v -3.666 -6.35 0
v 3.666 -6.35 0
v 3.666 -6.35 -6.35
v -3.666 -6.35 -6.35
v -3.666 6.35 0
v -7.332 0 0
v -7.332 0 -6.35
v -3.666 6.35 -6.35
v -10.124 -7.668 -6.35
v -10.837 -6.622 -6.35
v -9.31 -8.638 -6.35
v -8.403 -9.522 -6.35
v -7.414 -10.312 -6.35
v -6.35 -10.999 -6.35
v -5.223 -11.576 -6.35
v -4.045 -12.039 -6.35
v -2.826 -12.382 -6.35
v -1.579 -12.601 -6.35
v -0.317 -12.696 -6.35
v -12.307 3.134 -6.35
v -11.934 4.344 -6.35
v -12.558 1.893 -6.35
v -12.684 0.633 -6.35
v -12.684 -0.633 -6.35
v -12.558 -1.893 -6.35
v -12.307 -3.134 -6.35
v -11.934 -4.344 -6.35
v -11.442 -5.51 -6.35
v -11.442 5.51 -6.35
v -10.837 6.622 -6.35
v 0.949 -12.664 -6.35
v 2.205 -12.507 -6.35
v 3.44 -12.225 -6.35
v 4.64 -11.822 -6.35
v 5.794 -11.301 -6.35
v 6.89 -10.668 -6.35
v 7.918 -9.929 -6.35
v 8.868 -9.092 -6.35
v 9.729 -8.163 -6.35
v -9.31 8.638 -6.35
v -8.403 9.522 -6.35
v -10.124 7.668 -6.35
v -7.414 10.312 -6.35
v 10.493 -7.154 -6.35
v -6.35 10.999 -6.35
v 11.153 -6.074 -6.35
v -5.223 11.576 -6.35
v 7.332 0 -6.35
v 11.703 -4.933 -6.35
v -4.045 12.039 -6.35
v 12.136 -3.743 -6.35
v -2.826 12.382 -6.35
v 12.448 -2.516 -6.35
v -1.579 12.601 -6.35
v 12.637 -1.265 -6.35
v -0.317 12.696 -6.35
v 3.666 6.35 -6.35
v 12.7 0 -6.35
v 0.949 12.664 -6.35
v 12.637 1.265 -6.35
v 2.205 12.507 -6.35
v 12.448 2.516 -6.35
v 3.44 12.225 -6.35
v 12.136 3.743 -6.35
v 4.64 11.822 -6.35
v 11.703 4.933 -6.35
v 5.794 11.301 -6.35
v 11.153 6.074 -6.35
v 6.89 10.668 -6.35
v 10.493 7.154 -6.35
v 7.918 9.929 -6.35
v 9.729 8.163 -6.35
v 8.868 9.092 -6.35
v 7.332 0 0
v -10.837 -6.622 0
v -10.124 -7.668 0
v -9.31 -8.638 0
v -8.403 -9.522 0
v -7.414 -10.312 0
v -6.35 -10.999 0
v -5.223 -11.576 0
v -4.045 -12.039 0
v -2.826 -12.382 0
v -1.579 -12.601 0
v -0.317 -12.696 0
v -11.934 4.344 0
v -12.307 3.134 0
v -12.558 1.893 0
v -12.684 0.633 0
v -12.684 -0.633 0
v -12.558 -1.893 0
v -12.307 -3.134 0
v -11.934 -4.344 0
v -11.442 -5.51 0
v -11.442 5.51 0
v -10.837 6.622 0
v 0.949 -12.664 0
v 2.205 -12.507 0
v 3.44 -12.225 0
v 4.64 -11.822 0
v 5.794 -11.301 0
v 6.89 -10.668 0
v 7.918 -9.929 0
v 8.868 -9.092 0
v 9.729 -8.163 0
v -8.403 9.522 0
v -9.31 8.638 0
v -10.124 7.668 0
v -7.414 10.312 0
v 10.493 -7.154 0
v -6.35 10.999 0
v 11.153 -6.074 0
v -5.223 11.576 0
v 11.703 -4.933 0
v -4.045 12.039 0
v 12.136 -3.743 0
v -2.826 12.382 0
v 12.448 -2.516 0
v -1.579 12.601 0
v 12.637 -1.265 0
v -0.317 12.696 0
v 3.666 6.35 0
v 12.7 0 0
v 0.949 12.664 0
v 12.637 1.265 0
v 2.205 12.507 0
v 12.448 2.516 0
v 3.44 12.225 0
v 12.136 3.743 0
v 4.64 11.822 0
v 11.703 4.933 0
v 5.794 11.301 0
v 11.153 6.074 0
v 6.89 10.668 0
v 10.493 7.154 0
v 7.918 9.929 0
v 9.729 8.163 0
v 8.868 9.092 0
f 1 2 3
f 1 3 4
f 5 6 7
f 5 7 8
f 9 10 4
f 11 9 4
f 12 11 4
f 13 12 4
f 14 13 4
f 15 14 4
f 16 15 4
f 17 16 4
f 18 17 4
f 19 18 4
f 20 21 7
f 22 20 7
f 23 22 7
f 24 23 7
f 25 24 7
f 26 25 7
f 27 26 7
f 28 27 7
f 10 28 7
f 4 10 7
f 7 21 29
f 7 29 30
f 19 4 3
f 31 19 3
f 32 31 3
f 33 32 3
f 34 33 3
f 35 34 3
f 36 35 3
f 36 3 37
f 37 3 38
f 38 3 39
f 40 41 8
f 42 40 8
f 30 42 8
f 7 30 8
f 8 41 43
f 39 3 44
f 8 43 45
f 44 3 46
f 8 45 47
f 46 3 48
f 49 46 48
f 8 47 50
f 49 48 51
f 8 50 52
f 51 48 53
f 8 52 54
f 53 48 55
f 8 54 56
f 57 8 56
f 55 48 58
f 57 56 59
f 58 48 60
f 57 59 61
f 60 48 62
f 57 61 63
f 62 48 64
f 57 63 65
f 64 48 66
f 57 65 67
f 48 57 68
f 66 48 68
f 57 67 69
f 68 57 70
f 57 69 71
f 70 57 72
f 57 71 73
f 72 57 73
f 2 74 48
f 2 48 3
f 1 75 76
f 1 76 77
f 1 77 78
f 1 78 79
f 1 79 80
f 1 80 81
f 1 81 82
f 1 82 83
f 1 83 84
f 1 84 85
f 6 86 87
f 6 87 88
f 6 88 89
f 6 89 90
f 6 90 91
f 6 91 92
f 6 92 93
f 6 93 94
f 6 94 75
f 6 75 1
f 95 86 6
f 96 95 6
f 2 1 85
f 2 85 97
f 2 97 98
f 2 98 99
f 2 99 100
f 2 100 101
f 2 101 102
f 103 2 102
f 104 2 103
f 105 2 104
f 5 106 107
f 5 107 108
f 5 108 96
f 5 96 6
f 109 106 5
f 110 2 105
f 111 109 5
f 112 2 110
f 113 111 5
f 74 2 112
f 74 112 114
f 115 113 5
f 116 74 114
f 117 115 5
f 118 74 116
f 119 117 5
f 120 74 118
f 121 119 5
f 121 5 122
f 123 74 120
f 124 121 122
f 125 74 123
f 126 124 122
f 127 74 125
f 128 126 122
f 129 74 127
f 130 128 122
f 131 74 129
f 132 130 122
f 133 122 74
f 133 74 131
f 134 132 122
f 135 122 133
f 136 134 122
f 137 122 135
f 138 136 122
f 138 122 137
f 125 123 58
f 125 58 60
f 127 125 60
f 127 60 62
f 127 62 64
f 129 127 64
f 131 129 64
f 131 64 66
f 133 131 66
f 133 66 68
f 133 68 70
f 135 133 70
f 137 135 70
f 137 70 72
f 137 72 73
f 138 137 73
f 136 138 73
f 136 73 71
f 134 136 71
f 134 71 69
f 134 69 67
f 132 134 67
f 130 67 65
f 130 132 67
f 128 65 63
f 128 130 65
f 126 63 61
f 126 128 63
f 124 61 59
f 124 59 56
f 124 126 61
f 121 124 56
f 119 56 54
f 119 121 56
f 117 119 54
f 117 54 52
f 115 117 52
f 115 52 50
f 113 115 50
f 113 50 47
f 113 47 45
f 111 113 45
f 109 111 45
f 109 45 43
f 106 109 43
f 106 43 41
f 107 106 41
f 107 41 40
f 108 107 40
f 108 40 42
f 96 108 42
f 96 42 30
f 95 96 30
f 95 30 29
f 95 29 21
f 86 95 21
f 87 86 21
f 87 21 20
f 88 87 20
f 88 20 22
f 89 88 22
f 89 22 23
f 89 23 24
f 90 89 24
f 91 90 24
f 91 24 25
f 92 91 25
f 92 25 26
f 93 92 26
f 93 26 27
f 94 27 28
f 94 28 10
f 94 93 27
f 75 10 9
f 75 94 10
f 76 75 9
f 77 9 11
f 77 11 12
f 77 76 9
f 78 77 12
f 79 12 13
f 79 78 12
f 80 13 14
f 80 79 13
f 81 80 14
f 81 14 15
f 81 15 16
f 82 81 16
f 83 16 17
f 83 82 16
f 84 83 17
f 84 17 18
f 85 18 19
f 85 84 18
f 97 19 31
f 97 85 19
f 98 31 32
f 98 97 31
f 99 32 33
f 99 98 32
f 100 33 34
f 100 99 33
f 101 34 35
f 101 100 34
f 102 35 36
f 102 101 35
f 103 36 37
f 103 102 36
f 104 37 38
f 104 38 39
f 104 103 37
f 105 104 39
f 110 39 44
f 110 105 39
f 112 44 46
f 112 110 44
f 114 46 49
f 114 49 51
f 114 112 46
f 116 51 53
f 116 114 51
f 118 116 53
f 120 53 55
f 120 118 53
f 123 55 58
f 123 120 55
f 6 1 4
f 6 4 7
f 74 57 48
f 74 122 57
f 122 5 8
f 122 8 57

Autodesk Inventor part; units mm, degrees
ref_plane "YZ Plane" through (0, 0, 0) normal (1, 0, 0) x (0, 1, 0)
ref_plane "XZ Plane" through (0, 0, 0) normal (0, 1, 0) x (-1, 0, 0)
ref_plane "XY Plane" through (0, 0, 0) normal (0, 0, 1) x (1, 0, 0)
sketch "Sketch1" plane through (0, 0, 0) normal (0, 0, 1) x (1, 0, 0)
  line L0 (3.6662, 6.35) -> (7.3323, 0)
  line L1 (7.3323, 0) -> (3.6662, -6.35)
  line L2 (3.6662, -6.35) -> (-3.6662, -6.35)
  line L3 (-3.6662, -6.35) -> (-7.3323, 0)
  line L4 (-7.3323, 0) -> (-3.6662, 6.35)
  line L5 (-3.6662, 6.35) -> (3.6662, 6.35)
  circle A0 centre (0, 0) radius 12.7
  circle A1 centre (0, 0) radius 7.3323 construction
  dimension "d0" = 12.7
  dimension "d2" = 25.4
  dimension "d3" = 5.3677
extrude "Extrusion1" add sketch "Sketch1" against normal blind 6.35
properties part number "1_2x1-hexBearing" material "PC/ABS Plastic"
